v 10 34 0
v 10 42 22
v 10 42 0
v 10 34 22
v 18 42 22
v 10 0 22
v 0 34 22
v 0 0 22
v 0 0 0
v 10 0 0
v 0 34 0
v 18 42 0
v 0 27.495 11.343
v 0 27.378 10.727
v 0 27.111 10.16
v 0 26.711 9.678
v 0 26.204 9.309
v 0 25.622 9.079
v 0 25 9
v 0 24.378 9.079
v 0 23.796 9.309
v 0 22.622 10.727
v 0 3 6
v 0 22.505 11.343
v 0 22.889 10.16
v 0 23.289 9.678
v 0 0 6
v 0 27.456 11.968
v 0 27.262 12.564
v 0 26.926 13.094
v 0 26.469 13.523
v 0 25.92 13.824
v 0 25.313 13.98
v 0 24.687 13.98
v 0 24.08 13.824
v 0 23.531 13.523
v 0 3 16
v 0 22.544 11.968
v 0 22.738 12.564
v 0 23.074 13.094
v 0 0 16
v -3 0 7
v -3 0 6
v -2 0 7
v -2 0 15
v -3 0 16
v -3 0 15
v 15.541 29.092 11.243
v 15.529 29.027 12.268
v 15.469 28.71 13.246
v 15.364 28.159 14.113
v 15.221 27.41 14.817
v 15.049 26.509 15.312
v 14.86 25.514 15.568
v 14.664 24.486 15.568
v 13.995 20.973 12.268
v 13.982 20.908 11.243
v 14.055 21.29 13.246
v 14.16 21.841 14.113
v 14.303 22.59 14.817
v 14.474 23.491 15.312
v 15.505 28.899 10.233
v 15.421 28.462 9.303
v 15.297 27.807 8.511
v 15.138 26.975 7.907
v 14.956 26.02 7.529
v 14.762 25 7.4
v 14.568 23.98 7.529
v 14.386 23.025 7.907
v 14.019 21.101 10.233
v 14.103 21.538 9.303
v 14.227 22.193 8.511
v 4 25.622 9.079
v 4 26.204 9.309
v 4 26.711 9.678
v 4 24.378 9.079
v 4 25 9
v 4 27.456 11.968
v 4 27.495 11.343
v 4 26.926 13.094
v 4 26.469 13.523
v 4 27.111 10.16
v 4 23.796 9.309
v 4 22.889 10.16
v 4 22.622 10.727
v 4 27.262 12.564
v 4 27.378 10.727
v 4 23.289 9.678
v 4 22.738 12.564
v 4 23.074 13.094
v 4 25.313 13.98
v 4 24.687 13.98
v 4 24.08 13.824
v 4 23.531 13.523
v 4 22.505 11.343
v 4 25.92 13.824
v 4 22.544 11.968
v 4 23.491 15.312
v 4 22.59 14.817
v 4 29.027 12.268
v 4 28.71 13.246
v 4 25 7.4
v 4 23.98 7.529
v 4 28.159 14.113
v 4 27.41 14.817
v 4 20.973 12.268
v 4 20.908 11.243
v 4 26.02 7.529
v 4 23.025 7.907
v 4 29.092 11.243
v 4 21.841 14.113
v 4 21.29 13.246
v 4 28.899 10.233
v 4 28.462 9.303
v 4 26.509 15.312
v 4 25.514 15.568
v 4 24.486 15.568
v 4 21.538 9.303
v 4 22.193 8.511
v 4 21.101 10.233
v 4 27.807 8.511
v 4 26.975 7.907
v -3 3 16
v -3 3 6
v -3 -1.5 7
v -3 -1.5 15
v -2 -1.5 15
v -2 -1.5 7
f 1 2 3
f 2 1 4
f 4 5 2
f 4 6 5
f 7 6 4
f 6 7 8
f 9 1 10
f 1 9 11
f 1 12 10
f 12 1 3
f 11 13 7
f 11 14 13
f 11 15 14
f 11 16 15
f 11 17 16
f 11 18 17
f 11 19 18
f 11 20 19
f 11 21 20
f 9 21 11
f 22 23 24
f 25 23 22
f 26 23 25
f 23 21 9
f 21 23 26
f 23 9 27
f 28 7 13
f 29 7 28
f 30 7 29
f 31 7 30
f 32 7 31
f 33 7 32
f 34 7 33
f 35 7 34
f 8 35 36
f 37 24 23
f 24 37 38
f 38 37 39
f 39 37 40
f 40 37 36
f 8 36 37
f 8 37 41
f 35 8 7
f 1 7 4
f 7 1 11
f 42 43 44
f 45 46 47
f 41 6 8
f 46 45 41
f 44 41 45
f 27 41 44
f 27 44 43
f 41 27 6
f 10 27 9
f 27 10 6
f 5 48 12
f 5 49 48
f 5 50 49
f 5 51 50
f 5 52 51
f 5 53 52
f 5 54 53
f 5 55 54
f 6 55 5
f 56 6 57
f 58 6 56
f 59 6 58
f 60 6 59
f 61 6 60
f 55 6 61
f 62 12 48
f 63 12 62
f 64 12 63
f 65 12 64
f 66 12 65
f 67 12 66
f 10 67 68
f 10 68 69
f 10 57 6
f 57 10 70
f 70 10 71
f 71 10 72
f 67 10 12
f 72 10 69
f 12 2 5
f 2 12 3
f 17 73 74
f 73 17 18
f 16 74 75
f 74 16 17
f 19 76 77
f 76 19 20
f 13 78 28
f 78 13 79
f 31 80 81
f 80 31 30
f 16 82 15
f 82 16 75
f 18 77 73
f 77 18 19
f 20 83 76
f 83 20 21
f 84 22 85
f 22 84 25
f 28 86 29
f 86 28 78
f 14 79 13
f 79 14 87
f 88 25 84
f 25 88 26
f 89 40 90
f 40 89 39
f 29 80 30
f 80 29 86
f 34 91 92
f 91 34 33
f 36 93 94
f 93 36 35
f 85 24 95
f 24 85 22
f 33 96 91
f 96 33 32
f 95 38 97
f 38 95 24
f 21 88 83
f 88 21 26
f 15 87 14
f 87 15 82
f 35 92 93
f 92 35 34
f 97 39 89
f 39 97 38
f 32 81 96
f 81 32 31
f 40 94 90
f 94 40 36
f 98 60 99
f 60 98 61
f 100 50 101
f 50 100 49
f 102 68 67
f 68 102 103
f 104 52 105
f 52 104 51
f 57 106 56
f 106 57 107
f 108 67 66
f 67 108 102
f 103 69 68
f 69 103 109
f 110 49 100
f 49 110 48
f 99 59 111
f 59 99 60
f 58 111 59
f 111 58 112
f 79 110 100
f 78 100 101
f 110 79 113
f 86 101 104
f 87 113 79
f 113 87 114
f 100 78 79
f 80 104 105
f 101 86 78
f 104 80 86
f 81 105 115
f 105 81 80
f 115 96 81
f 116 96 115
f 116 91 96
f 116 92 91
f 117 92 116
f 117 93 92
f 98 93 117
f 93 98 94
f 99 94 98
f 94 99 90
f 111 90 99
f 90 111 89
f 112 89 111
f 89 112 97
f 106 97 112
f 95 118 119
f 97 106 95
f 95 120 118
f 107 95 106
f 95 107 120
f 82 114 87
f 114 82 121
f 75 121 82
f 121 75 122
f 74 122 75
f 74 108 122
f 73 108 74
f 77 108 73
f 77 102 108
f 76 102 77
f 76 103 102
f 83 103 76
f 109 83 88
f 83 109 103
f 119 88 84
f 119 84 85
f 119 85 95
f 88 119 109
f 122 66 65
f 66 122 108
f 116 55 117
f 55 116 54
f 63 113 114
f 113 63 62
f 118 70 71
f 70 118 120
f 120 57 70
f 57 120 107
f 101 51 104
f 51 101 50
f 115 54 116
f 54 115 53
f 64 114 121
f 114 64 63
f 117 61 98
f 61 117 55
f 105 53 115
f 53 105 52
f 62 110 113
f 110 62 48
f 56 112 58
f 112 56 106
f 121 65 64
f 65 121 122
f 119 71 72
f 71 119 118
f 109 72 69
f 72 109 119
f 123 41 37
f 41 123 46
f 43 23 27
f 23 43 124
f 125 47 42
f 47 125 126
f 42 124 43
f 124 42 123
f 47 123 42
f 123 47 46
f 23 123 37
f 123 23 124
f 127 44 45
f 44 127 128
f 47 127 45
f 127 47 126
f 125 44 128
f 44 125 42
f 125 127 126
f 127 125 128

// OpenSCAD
$fn = 25;

module main_body() {
  cube([10, 34, 22]);
  // Define vertices for the triangular prism
  vertices = [
      [10, 0, 0],    // A
      [10, 0, 22], 
      [10,42,0], // B
      [10,42,22],
      [18,42,0], // C
      [18,42,22]
  ];

  // Define faces using vertex indices
  faces = [
      [0, 4, 2], // top triangle
      [1, 3, 5], // bottom triangle
      [0, 2, 3, 1], // back panel
      [2, 4, 5, 3], // top panel
      [0, 1, 5, 4]  // right panel
  ];


  // Create the polyhedron
  polyhedron(points = vertices, faces = faces);
}

module lip() {
  translate([-3,0,6]) cube([3,3,10]);
  translate([-3,-1.5,7]) cube([1,1.5,8]);
}

module empty_space_same () {
  translate([2,2,2]) cube([16, 30, 18]);
  translate([0,25,9 + 2.5])  rotate([0,90,0]) cylinder(h = 40, d=5, centre = true);
}

module empty_space_printable () {
  translate([0,25,9 + 2.5])  rotate([0,90,0]) cylinder(h = 40, d=5, centre = true);
  translate([4,25,9 + 2.5])  rotate([0,90,0]) cylinder(h = 40, d=8.2, centre = true);
}

module main() {
  difference() {
    main_body();
    empty_space_printable();
  }
  
  lip();
}

#main();
